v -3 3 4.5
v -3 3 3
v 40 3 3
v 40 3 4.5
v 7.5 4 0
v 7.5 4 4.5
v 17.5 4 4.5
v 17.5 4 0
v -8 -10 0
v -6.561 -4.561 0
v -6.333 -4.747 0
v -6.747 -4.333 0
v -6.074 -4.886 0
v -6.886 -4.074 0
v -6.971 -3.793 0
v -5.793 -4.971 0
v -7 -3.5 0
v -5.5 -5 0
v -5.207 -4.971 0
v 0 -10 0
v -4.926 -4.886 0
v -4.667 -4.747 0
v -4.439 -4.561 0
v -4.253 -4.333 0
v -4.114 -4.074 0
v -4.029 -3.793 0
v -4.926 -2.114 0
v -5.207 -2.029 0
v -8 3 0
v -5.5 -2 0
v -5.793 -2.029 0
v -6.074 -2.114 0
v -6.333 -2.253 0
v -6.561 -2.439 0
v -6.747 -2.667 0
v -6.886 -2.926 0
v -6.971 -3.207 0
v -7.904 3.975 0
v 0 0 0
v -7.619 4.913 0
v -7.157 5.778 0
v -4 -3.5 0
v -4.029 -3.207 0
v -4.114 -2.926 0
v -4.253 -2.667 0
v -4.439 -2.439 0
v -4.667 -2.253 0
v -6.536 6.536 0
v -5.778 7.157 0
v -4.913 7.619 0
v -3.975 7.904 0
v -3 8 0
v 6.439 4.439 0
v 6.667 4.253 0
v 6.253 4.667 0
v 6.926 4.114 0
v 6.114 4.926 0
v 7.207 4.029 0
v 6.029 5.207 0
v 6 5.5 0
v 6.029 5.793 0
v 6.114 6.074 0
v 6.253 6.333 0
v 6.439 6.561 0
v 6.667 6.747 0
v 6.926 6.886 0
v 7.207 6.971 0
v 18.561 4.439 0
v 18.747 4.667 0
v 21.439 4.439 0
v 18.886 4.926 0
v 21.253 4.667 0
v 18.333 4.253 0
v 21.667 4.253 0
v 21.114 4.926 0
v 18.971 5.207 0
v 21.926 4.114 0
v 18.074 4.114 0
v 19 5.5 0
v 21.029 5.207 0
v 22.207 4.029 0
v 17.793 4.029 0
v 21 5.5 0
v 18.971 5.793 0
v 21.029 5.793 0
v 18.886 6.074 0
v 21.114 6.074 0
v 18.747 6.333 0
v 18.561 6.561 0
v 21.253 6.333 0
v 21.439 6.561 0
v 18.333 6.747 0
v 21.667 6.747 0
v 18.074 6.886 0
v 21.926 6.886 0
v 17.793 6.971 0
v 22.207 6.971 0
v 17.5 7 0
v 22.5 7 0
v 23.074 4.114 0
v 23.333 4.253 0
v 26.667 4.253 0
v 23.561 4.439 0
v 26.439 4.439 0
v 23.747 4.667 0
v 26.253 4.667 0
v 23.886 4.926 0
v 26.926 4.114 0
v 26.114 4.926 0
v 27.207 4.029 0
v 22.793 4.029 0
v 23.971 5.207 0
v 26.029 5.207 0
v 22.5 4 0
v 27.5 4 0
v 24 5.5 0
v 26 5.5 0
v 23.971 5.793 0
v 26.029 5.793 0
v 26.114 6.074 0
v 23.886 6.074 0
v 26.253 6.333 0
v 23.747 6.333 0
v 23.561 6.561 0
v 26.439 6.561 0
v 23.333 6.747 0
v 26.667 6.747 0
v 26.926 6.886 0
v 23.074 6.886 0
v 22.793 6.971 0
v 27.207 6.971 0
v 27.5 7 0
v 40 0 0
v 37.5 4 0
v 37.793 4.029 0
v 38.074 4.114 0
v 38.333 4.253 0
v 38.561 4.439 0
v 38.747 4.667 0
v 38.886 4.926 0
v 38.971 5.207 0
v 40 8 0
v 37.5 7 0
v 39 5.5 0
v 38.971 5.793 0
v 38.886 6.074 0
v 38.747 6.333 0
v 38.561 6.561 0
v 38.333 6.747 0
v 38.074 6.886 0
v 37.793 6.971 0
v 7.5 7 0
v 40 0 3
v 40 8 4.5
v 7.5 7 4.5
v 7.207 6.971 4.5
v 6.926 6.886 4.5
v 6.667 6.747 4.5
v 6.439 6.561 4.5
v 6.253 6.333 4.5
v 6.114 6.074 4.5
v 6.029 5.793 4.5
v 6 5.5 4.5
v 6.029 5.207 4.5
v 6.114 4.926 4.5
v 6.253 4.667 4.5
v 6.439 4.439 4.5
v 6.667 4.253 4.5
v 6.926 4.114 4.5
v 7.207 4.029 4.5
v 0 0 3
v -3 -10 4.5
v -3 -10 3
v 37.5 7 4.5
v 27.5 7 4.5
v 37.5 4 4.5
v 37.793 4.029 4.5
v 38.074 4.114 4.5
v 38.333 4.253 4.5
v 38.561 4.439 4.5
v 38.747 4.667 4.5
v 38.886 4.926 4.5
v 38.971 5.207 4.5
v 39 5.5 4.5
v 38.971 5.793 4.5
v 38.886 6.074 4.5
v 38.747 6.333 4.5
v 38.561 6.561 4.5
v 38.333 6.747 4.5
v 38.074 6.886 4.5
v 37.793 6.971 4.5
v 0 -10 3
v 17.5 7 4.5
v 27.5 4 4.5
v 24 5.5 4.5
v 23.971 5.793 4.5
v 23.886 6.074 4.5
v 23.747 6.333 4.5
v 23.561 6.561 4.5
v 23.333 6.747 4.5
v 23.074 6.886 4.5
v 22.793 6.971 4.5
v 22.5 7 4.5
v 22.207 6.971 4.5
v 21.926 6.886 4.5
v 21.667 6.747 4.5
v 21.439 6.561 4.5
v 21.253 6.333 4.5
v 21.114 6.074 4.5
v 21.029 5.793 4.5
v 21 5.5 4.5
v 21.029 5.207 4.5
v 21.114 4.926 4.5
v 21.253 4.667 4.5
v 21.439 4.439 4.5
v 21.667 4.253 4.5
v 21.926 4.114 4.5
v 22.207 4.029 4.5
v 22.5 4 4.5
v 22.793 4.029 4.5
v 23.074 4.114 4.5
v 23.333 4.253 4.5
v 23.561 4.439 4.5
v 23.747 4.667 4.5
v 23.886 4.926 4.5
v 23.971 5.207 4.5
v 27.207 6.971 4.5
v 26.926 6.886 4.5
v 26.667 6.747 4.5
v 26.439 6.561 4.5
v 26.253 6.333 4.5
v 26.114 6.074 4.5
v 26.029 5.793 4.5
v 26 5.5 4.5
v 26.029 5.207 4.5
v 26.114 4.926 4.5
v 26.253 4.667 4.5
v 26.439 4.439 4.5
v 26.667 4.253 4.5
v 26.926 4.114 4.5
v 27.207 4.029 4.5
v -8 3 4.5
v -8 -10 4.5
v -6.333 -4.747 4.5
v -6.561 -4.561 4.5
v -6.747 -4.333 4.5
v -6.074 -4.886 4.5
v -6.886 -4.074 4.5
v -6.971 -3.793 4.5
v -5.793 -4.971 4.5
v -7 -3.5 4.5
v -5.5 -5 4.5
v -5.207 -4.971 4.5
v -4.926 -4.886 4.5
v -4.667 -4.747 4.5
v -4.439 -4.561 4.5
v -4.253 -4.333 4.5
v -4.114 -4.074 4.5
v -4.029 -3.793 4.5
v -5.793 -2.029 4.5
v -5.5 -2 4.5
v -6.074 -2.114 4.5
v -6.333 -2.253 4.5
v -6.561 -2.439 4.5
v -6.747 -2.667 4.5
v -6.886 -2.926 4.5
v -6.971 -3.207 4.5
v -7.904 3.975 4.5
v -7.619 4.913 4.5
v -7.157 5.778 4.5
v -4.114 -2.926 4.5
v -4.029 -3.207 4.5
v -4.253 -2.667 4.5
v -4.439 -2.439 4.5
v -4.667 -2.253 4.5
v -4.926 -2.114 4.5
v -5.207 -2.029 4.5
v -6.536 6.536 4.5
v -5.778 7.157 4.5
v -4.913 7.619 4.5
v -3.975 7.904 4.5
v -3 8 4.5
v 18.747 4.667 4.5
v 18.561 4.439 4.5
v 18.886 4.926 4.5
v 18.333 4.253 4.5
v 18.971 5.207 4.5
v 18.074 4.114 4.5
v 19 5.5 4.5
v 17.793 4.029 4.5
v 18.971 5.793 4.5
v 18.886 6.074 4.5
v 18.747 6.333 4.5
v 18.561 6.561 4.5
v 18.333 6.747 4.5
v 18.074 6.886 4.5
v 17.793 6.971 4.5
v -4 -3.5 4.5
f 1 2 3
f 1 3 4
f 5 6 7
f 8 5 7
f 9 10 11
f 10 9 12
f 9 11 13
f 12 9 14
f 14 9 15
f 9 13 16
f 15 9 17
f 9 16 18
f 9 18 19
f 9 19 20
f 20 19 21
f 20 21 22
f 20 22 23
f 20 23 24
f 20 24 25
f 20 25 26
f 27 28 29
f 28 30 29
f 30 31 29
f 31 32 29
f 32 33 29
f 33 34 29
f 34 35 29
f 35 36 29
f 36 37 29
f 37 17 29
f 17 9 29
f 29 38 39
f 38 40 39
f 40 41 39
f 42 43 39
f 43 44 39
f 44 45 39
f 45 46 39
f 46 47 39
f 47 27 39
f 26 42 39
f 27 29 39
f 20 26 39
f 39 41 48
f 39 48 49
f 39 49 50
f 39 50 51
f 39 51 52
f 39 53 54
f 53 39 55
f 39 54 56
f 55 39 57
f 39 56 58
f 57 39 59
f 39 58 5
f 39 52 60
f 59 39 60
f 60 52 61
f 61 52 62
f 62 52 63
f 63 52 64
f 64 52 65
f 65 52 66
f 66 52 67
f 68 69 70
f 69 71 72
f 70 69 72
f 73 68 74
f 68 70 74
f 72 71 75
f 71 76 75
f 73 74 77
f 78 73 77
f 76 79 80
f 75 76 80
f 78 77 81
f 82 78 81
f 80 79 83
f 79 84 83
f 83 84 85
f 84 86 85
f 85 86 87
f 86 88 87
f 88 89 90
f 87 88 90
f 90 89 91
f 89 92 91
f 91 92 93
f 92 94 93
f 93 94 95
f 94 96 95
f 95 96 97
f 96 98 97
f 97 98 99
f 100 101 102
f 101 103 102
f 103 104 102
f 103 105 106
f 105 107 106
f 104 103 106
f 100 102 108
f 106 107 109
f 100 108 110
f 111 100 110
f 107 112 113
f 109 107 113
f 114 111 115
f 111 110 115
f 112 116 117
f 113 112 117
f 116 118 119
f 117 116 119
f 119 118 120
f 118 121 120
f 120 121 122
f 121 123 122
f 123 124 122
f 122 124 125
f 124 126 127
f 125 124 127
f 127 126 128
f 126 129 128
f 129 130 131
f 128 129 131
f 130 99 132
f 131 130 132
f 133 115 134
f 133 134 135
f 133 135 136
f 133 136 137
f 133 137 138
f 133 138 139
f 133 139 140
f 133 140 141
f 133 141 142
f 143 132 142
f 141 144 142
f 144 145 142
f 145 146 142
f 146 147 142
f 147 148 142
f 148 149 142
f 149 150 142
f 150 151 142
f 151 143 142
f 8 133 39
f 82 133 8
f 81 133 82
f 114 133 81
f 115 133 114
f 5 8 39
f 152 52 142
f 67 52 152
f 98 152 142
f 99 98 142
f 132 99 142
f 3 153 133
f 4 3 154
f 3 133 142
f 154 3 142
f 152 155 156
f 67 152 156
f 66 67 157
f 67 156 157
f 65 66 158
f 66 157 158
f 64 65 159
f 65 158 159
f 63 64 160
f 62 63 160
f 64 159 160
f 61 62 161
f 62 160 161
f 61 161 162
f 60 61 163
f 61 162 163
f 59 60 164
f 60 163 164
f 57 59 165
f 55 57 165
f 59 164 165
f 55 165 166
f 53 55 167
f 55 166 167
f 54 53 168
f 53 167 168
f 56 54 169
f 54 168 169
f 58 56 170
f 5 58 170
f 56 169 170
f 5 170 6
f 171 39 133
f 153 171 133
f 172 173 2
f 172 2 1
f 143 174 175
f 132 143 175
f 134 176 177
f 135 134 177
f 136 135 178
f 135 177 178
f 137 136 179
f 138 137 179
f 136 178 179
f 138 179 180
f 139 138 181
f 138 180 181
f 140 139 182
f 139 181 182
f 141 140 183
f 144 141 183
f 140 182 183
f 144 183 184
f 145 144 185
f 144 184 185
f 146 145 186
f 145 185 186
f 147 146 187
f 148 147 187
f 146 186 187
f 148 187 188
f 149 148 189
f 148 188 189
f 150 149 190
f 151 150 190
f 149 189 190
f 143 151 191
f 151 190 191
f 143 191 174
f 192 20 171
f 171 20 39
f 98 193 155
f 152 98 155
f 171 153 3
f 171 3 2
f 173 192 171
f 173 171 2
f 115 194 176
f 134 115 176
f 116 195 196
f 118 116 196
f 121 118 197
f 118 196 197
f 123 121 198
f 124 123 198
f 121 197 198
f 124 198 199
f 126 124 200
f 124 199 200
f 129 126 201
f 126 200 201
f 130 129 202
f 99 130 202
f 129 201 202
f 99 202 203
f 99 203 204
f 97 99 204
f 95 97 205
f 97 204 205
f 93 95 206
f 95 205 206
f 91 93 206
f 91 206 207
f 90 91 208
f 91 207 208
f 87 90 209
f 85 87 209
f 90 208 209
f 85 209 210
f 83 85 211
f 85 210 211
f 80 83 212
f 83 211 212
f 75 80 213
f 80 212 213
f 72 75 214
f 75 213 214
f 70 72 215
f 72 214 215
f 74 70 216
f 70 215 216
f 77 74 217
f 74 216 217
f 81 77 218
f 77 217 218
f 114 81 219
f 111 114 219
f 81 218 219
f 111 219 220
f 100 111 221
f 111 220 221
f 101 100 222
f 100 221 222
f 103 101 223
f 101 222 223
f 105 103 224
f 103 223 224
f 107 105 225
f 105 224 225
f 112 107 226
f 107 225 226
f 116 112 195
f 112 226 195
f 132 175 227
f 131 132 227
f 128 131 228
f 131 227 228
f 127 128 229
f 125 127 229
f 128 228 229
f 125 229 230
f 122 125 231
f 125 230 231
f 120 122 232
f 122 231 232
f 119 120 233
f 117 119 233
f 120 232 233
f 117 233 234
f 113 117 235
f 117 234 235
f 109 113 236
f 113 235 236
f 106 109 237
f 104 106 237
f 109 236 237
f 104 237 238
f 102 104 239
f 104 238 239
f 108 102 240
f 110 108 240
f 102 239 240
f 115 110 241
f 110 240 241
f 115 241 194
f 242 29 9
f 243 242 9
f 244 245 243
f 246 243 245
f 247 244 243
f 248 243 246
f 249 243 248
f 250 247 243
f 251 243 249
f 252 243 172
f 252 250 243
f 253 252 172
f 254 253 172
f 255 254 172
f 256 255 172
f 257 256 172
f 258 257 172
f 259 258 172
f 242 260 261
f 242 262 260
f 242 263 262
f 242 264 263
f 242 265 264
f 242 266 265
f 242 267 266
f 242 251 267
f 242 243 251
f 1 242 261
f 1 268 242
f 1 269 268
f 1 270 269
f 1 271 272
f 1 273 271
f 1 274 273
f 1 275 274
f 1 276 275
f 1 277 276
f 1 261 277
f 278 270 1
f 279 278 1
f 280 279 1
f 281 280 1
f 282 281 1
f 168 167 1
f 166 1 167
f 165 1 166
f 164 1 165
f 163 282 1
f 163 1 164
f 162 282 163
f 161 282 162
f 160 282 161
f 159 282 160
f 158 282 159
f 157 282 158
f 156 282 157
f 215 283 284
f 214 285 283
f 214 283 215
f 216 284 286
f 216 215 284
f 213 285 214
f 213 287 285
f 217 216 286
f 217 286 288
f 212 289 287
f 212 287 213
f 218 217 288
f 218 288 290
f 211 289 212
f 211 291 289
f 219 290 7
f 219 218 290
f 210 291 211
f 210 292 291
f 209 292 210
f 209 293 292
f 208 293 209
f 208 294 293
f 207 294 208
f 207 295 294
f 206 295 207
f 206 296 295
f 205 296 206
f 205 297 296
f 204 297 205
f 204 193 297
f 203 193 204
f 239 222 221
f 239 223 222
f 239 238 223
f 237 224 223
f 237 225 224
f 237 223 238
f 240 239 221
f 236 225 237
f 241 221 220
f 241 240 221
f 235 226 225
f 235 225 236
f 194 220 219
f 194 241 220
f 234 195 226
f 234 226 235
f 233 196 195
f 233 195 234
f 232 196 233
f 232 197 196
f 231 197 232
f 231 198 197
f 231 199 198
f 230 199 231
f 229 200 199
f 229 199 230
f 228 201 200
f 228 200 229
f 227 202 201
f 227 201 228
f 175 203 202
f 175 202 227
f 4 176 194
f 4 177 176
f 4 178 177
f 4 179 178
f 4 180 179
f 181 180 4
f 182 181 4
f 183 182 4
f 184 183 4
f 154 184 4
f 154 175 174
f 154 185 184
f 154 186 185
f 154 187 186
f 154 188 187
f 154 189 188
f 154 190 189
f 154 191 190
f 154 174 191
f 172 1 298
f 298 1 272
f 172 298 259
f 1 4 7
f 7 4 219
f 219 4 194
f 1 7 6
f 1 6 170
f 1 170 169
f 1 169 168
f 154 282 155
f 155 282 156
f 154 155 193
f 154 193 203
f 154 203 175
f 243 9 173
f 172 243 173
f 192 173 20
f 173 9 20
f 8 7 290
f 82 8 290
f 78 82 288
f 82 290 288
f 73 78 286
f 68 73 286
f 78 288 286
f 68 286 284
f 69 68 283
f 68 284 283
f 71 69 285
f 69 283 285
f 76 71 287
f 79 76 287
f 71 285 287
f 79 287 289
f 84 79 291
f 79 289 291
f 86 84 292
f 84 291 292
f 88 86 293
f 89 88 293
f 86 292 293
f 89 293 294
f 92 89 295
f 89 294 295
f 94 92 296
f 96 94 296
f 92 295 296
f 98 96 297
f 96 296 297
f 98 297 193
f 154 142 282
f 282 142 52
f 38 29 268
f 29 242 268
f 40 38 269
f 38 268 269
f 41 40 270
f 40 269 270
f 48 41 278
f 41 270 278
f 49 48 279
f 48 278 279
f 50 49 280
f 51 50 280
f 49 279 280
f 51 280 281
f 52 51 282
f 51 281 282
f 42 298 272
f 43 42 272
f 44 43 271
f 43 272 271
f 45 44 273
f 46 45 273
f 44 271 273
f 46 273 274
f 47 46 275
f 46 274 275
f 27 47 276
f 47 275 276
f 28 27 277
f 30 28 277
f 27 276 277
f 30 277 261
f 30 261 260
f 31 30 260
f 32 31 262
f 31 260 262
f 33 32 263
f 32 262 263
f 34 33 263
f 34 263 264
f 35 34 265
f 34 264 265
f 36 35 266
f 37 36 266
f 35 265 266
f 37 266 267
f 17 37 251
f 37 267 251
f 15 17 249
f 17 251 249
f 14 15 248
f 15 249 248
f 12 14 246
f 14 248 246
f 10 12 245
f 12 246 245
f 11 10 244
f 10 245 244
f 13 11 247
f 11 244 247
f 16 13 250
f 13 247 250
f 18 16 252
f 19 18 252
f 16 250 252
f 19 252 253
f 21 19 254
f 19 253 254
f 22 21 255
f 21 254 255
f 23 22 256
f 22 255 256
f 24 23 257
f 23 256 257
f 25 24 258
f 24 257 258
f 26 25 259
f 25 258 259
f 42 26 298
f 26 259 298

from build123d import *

# Parameters (mm, degrees)
F4_DEPTH = 4.5
F5_W     = 3
F5_H     = 1.5
F7_R     = 1.5
F8_DEPTH = 4.5
F9_R     = 5


with BuildPart() as f4:
    # F3 (on Top) → F4 (new body)
    with BuildSketch(Plane.XY):
        Polygon((0, -10), (0, 0), (40, 0), (40, 8), (-8, 8), (-8, -10), align=None)
    extrude(amount=F4_DEPTH)

    # F6: sweep along a path in F6_path
    with BuildLine(Plane(origin=(0, 0, 4.5), x_dir=(0, -1, 0), z_dir=(0, 0, -1))) as f6_path:
        Line((0, -40), (0, 0))
        Line((0, 0), (10, 0))
    # F5 (on face) → F6 (sweep, cut)
    with BuildSketch(Plane.YZ.offset(40)):
        with Locations((1.5, 3.75)):
            Rectangle(F5_W, F5_H)
    sweep(path=f6_path.line, transition=Transition.RIGHT, mode=Mode.SUBTRACT)

    # F7 (on face) → F8 (cut, through all)
    with BuildSketch(Plane.XY.offset(4.5)):
        with Locations((-5.5, -3.5)):
            Circle(F7_R)
        with BuildLine():
            Line((7.5, 3.9999998055), (17.5, 3.9999998055))
            ThreePointArc((17.5, 3.9999998055), (19, 5.4999998055), (17.5, 6.9999998055))
            Line((17.5, 6.9999998055), (7.5000000583, 7.0000001945))
            ThreePointArc((7.5000000583, 7.0000001945), (5.9999998055, 5.5000000292), (7.5, 3.9999998055))
        make_face()
        with Locations((22.5, 5.5)):
            Circle(F7_R)
        with BuildLine():
            Line((27.5, 4), (37.5, 4))
            ThreePointArc((37.5, 4), (39, 5.5), (37.5, 7))
            Line((37.5, 7), (27.5, 7))
            ThreePointArc((27.5, 7), (26, 5.5), (27.5, 4))
        make_face()
    extrude(amount=-F8_DEPTH, mode=Mode.SUBTRACT)

    # F9
    f9_edges = [f4.edges().sort_by_distance(p)[0] for p in [
        (-8, 8, 2.25),
    ]]
    fillet(f9_edges, radius=F9_R)


solid = f4.part
